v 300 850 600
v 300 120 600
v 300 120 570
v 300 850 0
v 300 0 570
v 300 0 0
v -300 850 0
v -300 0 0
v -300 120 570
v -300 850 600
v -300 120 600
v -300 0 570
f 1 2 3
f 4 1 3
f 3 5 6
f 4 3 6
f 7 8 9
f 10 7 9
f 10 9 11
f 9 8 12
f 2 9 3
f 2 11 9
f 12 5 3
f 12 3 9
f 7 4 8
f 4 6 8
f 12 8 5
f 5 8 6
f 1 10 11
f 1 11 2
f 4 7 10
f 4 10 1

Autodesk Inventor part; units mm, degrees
ref_plane "YZ Plane" through (0, 0, 0) normal (1, 0, 0) x (0, 1, 0)
ref_plane "XZ Plane" through (0, 0, 0) normal (0, 1, 0) x (-1, 0, 0)
ref_plane "XY Plane" through (0, 0, 0) normal (0, 0, 1) x (1, 0, 0)
sketch "Sketch1" plane through (0, 0, 0) normal (0, 1, 0) x (1, 0, 0)
  line L0 (300, 0) -> (-300, 0)
  line L1 (-300, 0) -> (-300, -600)
  line L2 (-300, -600) -> (300, -600)
  line L3 (300, -600) -> (300, 0)
  point P0 (0, 0)
  point P1 (0, 0)
  dimension "d0" = 600
  dimension "d1" = 600
extrude "Extrusion1" add sketch "Sketch1" along normal blind 850
sketch "Sketch2" plane through (-300, 0, 600) normal (0, 0, 1) x (-1, 0, 0)
  line L0 (-600, 0) -> (-600, -850) projected
  line L1 (0, 0) -> (0, -850) projected
  line L2 (-600, 0) -> (0, 0)
  line L3 (0, 0) -> (0, -120)
  line L4 (0, -120) -> (-600, -120)
  line L5 (-600, -120) -> (-600, 0)
  point P0 (-300, 0)
  dimension "d4" = 120
extrude "Extrusion2" cut sketch "Sketch2" against normal blind 30
properties part number "Mobile cottura"
